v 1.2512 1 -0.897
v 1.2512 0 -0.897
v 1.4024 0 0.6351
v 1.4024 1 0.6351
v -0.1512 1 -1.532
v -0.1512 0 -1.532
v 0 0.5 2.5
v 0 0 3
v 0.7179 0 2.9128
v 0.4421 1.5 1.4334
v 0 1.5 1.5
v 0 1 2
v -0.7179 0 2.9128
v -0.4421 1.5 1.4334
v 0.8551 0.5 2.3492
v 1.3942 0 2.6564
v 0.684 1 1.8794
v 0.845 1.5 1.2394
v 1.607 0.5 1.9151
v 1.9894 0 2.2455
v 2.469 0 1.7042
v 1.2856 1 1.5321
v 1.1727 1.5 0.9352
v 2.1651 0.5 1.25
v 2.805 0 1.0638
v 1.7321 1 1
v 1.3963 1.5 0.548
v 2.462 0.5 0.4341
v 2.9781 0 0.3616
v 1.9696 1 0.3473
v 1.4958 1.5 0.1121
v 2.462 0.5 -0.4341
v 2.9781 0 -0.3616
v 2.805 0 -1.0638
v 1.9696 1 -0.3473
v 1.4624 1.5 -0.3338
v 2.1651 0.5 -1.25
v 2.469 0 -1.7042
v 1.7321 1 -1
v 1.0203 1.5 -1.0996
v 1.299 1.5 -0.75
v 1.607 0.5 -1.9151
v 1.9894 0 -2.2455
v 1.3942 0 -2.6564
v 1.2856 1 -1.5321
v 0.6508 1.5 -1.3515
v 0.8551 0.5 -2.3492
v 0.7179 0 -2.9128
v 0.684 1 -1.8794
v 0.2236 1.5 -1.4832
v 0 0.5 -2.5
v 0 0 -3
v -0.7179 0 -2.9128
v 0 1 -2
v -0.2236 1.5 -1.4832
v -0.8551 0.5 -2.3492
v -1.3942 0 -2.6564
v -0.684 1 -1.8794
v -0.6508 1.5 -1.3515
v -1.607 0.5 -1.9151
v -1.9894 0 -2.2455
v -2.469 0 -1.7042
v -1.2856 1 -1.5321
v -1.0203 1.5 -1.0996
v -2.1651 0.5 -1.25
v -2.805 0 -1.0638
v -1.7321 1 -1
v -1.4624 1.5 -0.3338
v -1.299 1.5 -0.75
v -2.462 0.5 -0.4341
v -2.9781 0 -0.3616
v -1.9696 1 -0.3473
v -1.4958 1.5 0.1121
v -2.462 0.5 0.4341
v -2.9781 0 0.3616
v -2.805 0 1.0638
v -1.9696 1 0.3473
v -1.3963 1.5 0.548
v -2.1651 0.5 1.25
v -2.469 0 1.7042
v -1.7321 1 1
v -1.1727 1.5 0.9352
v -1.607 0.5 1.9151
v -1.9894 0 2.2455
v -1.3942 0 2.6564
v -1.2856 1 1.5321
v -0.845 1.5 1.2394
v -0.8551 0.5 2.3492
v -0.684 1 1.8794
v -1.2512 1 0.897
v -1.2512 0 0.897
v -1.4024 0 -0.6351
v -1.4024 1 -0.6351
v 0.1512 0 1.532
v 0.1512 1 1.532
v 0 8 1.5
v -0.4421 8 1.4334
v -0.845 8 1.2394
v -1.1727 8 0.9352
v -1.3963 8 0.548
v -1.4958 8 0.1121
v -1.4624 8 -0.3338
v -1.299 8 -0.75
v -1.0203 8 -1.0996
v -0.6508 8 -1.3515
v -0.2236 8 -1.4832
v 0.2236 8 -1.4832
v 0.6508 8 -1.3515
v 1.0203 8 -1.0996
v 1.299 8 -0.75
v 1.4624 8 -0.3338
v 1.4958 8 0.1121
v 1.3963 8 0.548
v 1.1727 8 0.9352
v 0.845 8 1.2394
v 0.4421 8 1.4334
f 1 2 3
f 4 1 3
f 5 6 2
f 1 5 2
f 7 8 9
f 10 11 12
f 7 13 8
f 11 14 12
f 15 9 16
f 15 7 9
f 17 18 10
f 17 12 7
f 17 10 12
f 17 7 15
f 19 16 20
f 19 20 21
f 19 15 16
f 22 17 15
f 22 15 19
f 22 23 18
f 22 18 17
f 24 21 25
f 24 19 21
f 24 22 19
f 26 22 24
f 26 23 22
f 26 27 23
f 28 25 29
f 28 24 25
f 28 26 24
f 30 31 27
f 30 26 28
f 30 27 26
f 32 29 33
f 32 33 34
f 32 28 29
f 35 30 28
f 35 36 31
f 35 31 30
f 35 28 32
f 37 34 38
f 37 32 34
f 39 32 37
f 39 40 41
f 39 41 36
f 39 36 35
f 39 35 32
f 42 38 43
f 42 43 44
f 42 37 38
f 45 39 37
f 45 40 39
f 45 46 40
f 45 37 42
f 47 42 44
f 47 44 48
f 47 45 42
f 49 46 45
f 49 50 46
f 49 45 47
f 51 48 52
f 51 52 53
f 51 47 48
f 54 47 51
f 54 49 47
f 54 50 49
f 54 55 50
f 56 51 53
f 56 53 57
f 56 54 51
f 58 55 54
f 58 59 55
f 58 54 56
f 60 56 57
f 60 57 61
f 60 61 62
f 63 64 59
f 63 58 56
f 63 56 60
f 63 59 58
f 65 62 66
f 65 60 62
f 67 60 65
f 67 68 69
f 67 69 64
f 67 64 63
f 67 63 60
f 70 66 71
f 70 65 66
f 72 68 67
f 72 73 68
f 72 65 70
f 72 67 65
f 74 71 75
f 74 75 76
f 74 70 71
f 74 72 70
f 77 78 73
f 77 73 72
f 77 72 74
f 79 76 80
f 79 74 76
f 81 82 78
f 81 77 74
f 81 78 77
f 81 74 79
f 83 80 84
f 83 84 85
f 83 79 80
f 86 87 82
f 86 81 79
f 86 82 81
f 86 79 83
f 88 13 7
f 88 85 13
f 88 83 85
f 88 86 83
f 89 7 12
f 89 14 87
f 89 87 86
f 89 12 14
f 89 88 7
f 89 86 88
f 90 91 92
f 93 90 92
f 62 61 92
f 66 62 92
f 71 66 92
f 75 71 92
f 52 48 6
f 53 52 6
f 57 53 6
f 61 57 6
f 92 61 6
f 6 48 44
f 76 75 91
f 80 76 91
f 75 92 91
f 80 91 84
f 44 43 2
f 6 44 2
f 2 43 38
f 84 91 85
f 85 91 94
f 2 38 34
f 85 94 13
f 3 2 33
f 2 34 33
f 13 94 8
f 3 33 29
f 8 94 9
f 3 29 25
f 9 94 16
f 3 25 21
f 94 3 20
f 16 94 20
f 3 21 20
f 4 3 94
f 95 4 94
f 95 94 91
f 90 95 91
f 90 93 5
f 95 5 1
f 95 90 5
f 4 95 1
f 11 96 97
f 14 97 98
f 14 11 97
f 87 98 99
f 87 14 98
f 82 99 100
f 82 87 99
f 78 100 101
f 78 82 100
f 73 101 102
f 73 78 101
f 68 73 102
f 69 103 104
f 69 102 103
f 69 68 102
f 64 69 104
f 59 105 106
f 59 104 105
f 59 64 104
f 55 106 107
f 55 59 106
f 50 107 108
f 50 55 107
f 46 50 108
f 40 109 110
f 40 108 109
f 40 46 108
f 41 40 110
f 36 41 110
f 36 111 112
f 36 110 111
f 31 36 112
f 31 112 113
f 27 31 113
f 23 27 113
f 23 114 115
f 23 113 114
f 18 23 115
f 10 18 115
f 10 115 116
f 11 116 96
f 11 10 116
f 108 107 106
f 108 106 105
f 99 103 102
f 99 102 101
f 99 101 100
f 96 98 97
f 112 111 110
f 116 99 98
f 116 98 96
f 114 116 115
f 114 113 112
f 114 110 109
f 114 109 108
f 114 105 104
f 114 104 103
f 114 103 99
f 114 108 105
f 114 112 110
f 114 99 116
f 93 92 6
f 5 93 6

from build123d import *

# Parameters (mm, degrees)
SKETCH1_R           = 3
BOSS_EXTRUDE1_DEPTH = 2.5
SKETCH2_R           = 1.5
BOSS_EXTRUDE2_DEPTH = 5.5
CHAMFER1_SIZE       = 2.5
CUT_EXTRUDE1_DEPTH  = 1


with BuildPart() as part:
    # Sketch1 → Boss-Extrude1 (new body)
    with BuildSketch(Plane(origin=(0, 0, 0), x_dir=(1, 0, 0), z_dir=(0, 1, 0))):
        with Locations(Location((0, 0, 0), (0, 0, 270))):
            Circle(SKETCH1_R)
    extrude(amount=BOSS_EXTRUDE1_DEPTH)

    # Sketch2 → Boss-Extrude2 (add)
    with BuildSketch(Plane(origin=(0, 2.5, 0), x_dir=(1, 0, 0), z_dir=(0, 1, 0))):
        with Locations(Location((0, 0, 0), (0, 0, 270))):
            Circle(SKETCH2_R)
    extrude(amount=BOSS_EXTRUDE2_DEPTH)

    # Chamfer1
    # the kernel refuses this chamfer: 2.5 mm, written as the material it takes off along each edge
    with BuildSketch(Plane(origin=(0, 2.5, 0), x_dir=(0, 0, 1), z_dir=(-1, 0, 0))) as chamfer1_piece_1_section:
        Polygon((3, -CHAMFER1_SIZE), (3 - CHAMFER1_SIZE, 0), (3, 0), align=None)
    chamfer1_piece_1 = revolve(axis=Axis((0, 2.5, 0), (0, 1, 0)), mode=Mode.PRIVATE)
    chamfer1_piece_1 = chamfer1_piece_1 - Plane(origin=(0, 0.739386172, 0), x_dir=(0, 0, 1), z_dir=(0, -1, 0)) * Cylinder(1.5, 12, mode=Mode.PRIVATE)
    add(chamfer1_piece_1, mode=Mode.SUBTRACT)

    # Sketch3 → Cut-Extrude1 (cut)
    with BuildSketch(Plane.XZ):
        Polygon((1.251191911, -0.896964433), (1.402389941, 0.635081763), (0.15119803, 1.532046196), (-1.251191911, 0.896964433), (-1.402389941, -0.635081763), (-0.15119803, -1.532046196), align=None)
    extrude(amount=-CUT_EXTRUDE1_DEPTH, mode=Mode.SUBTRACT)


solid = part.part
